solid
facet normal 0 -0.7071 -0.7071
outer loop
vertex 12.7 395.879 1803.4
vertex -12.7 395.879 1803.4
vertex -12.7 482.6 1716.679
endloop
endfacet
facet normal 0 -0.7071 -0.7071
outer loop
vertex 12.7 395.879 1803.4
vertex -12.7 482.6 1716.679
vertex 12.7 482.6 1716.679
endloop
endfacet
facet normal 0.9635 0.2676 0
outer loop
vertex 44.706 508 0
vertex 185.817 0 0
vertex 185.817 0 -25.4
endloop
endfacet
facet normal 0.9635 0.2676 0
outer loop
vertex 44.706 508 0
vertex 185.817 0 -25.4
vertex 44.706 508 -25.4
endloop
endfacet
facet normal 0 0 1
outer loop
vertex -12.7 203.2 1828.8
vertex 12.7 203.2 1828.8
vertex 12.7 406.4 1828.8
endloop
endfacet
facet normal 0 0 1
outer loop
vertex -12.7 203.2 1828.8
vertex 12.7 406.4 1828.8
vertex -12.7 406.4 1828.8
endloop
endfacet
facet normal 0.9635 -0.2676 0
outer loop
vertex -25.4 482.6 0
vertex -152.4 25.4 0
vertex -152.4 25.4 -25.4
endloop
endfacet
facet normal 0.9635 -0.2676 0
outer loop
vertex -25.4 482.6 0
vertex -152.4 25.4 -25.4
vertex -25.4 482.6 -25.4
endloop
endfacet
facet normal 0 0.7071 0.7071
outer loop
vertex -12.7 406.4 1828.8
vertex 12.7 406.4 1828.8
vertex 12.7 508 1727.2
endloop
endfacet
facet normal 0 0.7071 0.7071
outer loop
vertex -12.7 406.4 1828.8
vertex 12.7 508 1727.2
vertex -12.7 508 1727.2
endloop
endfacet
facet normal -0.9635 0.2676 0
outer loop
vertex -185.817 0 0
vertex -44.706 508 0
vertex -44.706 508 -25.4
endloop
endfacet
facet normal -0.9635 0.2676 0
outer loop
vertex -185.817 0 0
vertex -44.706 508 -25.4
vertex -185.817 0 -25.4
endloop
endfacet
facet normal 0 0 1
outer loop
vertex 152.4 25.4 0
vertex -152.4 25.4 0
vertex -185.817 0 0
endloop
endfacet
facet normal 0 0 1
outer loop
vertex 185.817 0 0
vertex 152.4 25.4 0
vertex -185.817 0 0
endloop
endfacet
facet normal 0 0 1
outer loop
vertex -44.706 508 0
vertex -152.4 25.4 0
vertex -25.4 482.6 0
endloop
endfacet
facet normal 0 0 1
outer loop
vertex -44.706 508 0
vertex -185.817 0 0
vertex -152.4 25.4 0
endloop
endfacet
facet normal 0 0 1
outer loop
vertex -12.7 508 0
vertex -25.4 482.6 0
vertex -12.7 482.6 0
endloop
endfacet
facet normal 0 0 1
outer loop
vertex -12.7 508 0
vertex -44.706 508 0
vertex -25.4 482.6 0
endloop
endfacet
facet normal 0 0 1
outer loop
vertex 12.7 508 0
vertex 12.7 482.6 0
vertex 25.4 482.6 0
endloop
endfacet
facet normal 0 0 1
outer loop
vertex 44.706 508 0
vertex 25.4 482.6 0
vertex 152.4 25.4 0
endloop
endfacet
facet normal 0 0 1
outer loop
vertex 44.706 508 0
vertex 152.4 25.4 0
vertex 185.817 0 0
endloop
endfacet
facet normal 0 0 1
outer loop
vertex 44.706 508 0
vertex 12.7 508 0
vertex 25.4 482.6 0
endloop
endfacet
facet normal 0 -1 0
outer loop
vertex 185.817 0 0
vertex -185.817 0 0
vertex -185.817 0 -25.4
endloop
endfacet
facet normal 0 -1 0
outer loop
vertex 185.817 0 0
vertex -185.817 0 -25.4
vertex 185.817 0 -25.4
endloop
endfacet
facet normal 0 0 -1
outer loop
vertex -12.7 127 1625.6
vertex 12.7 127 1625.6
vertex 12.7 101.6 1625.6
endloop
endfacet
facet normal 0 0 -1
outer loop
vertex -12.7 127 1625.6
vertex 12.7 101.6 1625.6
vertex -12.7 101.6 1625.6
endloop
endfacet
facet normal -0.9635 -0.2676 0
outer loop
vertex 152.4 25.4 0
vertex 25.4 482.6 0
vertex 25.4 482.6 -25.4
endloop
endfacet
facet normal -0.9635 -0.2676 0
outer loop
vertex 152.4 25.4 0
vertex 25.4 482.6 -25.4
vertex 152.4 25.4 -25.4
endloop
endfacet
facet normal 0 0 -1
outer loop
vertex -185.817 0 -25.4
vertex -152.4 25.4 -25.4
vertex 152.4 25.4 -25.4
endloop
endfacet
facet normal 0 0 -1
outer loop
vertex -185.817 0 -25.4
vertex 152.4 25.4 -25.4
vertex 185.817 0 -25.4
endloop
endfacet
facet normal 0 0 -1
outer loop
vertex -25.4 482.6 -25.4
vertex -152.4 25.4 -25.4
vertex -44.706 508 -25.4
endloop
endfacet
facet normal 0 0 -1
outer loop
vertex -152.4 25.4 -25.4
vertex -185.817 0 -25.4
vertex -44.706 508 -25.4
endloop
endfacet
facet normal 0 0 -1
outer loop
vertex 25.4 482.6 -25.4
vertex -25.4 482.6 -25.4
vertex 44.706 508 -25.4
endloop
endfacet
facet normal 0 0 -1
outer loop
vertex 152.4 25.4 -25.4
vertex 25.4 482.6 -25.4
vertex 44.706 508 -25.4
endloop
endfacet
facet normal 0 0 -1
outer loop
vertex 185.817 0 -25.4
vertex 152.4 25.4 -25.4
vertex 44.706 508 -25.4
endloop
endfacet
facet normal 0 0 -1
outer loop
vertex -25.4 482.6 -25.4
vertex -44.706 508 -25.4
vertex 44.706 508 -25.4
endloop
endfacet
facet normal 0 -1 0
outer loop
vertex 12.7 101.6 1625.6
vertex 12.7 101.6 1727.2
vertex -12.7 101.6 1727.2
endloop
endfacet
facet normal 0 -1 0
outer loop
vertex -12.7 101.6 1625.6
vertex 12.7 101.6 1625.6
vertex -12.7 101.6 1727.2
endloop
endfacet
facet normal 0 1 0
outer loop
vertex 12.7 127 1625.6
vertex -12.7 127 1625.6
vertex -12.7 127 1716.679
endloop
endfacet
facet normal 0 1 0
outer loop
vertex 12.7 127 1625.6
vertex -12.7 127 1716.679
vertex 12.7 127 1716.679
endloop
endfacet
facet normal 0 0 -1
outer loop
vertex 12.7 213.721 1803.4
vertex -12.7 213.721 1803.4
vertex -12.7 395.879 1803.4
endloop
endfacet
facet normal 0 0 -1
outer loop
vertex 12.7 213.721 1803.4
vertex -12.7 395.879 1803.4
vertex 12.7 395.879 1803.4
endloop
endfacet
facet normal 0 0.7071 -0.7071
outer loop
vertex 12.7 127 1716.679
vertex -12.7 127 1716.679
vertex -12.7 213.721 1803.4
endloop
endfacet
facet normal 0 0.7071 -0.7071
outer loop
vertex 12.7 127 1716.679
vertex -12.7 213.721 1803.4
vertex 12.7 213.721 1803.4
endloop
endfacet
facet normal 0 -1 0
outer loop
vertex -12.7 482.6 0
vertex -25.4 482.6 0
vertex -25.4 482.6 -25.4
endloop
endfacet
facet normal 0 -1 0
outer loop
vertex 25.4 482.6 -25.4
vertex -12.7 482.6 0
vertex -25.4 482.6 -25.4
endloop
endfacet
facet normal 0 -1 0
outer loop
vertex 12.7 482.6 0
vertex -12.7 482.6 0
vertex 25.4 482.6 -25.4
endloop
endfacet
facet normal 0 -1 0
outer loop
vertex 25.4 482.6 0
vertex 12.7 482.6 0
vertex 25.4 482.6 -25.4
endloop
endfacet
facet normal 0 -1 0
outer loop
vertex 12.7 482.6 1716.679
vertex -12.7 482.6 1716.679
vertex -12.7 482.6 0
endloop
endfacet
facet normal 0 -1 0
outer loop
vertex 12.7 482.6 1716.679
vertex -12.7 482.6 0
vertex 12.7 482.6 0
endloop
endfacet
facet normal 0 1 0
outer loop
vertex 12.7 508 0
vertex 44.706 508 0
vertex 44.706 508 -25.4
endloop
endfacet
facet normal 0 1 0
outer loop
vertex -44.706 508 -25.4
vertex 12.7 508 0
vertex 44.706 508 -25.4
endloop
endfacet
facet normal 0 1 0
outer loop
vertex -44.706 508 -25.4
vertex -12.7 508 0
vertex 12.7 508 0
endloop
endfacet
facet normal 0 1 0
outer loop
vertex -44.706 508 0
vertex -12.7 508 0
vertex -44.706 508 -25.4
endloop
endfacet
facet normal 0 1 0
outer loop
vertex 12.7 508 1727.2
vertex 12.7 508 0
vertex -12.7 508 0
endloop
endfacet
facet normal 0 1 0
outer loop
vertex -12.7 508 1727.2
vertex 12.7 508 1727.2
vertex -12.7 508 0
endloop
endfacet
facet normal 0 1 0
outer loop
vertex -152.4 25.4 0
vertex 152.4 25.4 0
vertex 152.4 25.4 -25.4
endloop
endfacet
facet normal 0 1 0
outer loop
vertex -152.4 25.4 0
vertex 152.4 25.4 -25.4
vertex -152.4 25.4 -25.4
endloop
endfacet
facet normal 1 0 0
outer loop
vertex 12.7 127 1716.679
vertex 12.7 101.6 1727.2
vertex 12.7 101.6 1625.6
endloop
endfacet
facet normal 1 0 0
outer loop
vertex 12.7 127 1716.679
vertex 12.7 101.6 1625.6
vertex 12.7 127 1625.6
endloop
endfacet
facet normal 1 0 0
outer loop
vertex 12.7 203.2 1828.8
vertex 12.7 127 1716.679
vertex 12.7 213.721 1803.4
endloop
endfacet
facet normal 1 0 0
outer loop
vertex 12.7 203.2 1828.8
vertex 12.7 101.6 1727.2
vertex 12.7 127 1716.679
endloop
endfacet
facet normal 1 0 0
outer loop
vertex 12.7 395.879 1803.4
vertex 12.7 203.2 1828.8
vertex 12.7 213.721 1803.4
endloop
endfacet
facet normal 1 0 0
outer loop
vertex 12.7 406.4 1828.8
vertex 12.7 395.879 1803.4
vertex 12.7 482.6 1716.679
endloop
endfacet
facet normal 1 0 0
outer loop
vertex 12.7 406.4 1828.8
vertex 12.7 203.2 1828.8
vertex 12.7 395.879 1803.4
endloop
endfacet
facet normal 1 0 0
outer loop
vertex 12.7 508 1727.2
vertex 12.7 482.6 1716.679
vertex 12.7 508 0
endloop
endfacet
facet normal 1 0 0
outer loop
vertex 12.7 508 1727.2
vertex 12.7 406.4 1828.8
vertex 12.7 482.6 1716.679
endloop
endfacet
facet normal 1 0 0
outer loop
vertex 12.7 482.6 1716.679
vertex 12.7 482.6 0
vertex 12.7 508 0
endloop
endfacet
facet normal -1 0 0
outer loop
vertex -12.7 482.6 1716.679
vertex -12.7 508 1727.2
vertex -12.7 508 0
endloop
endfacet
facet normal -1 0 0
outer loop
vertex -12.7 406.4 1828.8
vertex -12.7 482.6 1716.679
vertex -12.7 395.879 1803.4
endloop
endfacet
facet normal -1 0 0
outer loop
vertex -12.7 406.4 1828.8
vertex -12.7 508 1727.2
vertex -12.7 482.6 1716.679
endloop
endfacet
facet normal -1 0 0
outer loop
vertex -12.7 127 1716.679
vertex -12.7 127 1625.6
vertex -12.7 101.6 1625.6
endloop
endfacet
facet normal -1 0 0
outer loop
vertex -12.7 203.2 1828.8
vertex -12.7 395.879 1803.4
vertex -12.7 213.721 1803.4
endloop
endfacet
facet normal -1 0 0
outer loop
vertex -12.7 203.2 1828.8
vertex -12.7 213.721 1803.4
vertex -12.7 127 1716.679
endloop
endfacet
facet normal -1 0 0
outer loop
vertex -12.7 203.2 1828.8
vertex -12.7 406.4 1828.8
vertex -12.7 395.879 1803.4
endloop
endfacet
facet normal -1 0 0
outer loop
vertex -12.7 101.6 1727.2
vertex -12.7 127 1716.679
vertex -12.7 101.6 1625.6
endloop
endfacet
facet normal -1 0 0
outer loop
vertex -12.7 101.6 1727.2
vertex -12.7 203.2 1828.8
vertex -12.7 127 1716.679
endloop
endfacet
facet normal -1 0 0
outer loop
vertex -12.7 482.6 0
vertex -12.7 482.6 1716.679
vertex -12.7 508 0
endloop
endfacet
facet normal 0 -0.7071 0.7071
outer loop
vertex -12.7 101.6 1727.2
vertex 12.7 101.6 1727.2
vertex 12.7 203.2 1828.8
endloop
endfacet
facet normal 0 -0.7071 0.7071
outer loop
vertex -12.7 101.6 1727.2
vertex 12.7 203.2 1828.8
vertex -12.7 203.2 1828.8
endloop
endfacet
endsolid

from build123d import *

# Parameters (mm, degrees)
F1_DEPTH = 25.4
F2_W     = 25.4
F2_H     = 25.4


with BuildPart() as f1:
    # F0 (on Top) → F1 (new body)
    with BuildSketch(Plane.XY):
        Polygon((44.7061754991, 508), (-44.7061754991, 508), (-185.8172866102, 0), (185.8172866102, 0), align=None)
        Polygon((-152.4, 25.4), (-25.4, 482.6), (25.4, 482.6), (152.4, 25.4), align=None, mode=Mode.SUBTRACT)
    extrude(amount=-F1_DEPTH)

    # F4: sweep along a path in F3
    with BuildLine(Plane.YZ) as f4_path:
        Line((508, 0), (508, 1727.2))
        Line((508, 1727.2), (406.4, 1828.8))
        Line((406.4, 1828.8), (203.2, 1828.8))
        Line((203.2, 1828.8), (101.6, 1727.2))
        Line((101.6, 1727.2), (101.6, 1625.6))
    # F2 (on Top) → F4 (sweep)
    with BuildSketch(Plane.XY):
        with Locations((0, 495.3)):
            Rectangle(F2_W, F2_H)
    sweep(path=f4_path.line, transition=Transition.RIGHT)


solid = f1.part
